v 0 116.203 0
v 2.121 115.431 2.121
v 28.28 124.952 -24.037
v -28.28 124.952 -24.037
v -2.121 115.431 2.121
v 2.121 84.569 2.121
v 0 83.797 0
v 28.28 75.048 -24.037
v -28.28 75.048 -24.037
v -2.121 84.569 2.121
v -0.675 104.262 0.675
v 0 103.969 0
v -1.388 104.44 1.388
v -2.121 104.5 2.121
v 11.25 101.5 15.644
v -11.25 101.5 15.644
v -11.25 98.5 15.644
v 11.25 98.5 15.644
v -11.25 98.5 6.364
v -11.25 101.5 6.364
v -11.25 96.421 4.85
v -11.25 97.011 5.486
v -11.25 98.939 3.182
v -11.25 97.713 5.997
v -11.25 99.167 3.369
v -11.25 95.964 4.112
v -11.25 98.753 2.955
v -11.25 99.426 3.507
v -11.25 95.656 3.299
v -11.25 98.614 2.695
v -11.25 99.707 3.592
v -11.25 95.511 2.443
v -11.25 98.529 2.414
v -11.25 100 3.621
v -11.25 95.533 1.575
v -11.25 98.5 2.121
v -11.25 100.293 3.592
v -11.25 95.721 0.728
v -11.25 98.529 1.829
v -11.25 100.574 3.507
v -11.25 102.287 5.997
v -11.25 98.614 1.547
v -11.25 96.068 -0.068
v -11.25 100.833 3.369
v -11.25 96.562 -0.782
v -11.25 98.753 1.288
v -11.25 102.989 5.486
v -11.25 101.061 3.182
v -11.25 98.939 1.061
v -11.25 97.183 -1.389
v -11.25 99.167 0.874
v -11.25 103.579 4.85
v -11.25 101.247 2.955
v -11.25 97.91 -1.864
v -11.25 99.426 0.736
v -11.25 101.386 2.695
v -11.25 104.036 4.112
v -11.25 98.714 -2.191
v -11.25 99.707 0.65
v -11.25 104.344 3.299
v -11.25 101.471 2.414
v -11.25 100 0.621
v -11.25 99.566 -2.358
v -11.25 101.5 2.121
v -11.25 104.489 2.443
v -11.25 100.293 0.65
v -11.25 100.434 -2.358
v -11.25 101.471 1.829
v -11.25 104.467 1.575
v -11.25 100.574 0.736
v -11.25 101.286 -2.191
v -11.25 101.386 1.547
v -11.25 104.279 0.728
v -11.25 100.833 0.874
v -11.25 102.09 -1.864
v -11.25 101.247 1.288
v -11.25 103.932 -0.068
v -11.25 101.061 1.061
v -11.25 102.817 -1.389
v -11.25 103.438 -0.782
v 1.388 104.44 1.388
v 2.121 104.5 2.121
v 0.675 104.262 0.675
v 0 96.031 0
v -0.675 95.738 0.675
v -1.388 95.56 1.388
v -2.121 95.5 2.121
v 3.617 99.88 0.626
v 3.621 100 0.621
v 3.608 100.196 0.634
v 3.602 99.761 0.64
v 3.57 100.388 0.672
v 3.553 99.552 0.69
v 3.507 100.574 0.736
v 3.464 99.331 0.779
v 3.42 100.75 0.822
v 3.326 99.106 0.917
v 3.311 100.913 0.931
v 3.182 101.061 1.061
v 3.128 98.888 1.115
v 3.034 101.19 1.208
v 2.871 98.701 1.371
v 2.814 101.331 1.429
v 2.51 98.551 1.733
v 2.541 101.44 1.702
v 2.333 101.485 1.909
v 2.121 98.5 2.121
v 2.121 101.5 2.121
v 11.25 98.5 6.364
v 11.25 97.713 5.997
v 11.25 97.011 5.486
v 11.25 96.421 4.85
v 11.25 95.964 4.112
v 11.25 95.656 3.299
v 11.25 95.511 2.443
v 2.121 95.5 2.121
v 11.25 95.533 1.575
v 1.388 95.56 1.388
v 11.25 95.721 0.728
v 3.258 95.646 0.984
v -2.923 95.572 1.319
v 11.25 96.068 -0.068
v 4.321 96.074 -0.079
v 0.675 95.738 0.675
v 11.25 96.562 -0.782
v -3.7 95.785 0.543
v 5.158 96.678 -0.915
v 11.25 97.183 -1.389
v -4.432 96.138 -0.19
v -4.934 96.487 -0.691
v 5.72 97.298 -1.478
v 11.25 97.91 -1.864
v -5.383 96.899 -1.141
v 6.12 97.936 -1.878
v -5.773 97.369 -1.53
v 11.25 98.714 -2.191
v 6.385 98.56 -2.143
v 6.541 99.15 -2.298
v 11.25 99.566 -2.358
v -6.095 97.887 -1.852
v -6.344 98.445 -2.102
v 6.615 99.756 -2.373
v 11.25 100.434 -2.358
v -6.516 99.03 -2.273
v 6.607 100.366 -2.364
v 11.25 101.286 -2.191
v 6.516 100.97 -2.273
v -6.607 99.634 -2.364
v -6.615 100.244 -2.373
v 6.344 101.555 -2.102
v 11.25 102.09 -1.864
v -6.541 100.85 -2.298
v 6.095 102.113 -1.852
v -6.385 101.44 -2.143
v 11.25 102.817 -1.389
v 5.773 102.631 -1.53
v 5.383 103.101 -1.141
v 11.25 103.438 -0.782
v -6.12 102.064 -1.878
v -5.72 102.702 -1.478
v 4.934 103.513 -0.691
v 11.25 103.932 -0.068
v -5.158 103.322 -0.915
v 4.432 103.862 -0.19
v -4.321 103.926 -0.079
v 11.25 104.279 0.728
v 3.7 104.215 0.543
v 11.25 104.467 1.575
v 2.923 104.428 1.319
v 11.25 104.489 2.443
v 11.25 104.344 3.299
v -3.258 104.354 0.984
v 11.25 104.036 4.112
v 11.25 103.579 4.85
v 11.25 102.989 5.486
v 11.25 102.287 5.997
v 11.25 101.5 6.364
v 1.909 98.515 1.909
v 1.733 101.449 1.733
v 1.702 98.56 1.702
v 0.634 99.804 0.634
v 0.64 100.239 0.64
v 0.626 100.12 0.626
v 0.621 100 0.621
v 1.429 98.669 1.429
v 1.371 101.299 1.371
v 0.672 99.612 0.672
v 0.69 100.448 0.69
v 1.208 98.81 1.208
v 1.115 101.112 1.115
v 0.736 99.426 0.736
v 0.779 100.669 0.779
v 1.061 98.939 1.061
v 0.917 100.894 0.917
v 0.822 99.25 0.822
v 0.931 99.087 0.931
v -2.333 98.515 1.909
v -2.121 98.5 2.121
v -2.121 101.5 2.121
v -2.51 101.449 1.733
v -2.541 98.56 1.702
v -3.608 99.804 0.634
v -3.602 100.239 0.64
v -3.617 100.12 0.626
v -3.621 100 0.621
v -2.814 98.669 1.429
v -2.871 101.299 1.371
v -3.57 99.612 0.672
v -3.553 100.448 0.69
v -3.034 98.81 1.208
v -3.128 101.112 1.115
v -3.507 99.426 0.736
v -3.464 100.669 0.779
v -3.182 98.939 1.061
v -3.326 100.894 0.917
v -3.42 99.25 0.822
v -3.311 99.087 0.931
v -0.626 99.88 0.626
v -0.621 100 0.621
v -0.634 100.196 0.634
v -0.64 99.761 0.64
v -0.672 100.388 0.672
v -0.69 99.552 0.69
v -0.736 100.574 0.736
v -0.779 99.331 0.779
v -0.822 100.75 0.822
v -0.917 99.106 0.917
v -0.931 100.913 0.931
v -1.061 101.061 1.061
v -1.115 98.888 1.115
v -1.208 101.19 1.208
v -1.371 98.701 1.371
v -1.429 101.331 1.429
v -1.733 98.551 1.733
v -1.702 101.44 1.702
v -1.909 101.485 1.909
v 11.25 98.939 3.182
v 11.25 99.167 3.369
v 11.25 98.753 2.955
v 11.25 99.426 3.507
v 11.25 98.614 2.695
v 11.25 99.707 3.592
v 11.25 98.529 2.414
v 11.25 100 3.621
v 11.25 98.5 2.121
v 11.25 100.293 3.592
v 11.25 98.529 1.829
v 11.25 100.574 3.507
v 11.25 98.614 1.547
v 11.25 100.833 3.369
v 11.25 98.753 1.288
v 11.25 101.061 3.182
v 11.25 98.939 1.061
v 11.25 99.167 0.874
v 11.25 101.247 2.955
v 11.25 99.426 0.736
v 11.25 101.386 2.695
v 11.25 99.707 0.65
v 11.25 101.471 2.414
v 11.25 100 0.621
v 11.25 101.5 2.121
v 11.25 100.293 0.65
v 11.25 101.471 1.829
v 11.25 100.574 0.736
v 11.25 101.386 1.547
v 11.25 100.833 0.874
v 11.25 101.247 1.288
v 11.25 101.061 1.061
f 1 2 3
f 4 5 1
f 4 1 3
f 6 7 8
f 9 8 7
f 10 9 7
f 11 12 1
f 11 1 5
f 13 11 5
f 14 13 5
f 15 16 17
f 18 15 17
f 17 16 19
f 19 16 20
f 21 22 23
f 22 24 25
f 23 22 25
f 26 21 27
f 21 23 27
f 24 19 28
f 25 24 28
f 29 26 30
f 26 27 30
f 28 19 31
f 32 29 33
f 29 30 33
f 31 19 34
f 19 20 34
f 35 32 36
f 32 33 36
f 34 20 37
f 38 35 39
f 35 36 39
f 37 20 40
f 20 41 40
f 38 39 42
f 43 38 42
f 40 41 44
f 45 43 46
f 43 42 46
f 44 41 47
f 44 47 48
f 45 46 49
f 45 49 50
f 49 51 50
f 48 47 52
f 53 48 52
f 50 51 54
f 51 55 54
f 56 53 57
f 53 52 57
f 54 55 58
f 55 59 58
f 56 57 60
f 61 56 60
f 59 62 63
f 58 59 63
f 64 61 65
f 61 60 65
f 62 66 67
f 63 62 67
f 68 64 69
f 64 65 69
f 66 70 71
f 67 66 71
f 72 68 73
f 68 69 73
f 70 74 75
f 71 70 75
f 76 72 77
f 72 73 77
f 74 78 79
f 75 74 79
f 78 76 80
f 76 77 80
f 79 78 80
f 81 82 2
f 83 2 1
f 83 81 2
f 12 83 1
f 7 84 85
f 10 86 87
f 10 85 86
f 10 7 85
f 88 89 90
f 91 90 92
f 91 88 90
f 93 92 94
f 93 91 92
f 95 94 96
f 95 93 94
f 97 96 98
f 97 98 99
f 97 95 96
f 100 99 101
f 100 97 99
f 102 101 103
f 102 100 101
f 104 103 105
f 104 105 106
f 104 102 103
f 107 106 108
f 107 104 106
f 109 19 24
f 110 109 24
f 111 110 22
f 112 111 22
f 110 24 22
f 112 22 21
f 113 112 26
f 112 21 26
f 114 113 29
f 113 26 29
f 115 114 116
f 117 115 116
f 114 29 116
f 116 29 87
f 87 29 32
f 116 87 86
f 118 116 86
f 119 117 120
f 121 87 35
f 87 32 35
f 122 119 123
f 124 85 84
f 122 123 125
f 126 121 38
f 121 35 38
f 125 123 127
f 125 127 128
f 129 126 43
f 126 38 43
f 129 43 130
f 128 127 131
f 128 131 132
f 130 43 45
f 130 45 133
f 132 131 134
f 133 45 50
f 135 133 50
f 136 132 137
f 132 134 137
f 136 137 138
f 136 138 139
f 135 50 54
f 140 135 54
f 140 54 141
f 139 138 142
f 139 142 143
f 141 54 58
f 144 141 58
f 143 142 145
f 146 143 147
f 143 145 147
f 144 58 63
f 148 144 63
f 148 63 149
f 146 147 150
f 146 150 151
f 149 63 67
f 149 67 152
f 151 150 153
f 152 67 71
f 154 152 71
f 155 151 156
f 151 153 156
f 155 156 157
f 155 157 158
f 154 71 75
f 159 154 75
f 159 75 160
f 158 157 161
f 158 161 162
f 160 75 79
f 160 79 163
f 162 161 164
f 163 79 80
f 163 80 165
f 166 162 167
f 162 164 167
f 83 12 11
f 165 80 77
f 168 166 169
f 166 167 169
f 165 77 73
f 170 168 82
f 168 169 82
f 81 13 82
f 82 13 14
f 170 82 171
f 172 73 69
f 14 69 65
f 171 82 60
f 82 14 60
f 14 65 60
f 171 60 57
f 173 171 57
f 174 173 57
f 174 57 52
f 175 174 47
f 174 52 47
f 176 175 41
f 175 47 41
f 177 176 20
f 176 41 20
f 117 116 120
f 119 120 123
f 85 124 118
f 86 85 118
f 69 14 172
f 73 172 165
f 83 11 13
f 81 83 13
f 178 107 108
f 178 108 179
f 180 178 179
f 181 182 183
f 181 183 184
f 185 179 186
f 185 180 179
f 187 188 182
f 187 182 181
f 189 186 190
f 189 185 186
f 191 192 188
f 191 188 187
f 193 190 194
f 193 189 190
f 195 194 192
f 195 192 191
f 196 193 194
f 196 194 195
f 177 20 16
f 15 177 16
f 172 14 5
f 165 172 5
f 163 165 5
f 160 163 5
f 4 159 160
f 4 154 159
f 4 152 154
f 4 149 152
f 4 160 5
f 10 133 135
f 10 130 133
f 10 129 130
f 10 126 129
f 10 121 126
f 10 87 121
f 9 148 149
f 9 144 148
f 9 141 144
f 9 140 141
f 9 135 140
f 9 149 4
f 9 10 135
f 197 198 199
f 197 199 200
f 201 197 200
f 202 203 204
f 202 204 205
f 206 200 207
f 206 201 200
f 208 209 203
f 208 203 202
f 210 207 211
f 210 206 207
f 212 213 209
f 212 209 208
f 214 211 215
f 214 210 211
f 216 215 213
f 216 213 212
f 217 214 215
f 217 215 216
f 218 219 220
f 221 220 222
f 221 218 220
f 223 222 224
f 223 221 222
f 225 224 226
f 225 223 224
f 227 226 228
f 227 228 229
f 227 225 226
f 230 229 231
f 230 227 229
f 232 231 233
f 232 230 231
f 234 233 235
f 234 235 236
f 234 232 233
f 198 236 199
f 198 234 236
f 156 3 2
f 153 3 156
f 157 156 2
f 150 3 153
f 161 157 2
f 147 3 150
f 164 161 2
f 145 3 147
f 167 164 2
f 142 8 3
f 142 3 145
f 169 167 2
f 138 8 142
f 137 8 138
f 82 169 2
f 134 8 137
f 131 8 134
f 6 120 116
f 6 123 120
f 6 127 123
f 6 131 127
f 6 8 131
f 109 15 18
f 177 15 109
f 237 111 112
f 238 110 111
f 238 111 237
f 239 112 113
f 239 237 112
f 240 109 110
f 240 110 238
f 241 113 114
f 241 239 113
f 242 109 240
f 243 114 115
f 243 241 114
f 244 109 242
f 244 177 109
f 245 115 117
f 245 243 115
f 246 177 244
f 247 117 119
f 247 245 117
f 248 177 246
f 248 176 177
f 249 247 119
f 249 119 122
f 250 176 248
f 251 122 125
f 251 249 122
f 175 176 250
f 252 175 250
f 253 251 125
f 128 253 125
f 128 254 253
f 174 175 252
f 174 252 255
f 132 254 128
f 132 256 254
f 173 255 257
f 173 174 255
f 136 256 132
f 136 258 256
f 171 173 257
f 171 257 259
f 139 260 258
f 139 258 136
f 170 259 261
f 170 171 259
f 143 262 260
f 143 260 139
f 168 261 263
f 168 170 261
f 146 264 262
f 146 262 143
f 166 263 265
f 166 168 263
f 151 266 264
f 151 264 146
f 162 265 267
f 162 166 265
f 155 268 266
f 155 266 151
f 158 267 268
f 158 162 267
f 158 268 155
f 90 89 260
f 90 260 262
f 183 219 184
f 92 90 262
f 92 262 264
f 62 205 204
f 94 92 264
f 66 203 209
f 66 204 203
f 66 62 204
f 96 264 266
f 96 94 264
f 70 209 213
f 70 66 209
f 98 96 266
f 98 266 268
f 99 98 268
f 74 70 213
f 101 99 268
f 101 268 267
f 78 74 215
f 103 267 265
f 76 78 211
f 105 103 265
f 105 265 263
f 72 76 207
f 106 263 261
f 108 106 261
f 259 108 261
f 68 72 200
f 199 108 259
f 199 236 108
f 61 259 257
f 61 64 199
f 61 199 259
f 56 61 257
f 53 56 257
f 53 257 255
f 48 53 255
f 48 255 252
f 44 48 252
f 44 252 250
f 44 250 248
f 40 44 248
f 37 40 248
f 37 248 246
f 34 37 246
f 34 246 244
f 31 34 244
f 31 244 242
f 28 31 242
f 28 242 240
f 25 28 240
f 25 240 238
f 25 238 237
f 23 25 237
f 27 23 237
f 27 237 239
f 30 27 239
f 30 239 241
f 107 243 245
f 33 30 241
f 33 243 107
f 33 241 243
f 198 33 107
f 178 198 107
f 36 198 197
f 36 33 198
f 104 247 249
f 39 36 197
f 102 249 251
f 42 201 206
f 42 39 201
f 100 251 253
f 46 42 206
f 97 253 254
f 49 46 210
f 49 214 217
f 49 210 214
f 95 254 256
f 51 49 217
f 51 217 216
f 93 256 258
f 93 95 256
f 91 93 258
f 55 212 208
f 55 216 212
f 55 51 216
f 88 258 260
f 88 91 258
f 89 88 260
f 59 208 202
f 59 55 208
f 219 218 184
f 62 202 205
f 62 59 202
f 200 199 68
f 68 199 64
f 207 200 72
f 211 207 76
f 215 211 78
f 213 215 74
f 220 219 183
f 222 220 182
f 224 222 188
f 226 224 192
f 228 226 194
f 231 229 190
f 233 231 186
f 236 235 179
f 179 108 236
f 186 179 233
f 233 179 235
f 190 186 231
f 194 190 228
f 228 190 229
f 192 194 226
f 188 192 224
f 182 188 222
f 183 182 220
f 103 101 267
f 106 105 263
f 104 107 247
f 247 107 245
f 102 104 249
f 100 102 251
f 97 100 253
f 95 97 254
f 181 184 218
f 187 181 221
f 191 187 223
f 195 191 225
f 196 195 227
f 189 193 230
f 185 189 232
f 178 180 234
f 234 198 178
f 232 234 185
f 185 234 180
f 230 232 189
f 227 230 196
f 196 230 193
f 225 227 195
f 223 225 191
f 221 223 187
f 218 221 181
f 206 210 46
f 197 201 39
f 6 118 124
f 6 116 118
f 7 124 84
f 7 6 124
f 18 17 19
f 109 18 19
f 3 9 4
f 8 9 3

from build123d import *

# Parameters (mm, degrees)
EXTRUDE_1_DEPTH          = 200
CUT_EXTRUDE_1_DEPTH      = 222.718927326
CUT_EXTRUDE_1_DEPTH_BACK = 222.718927326
SKETCH_2_R               = 150
SKETCH_2_R_2             = 1.5
EXTRUDE_4_DEPTH          = 11.25
EXTRUDE_4_DEPTH_BACK     = 11.25
SKETCH_5_R               = 1.5
CUT_EXTRUDE_2_DEPTH      = 133.789577673
CUT_EXTRUDE_2_DEPTH_BACK = 133.789577673


with BuildPart() as part:
    # Эскиз1 → Бобышка-Вытянуть1 (new body)
    with BuildSketch(Plane(origin=(0, 0, 0), x_dir=(1, 0, 0), z_dir=(0, 1, 0))):
        Polygon((-63.065580883, 65.518470958), (69.761111645, 65.518470958), (2.121320344, -2.121320344), (0, 0), (-2.121320344, -2.121320344), (-69.761111645, 65.518470958), align=None)
    extrude(amount=EXTRUDE_1_DEPTH)

    # Эскиз2 → Вырез-Вытянуть1 (cut, two sides: drawn at the far end of the back side and taken through both)
    with BuildSketch(Plane(origin=(0, 0, 0), x_dir=(0, 0, -1), z_dir=(1, 0, 0)).offset(-CUT_EXTRUDE_1_DEPTH_BACK)):
        with Locations((-2.121320344, 100)):
            Circle(SKETCH_2_R)
        with Locations((-2.121320344, 100)):
            Circle(SKETCH_2_R_2, mode=Mode.SUBTRACT)
        Polygon((27.212959944, 126.107382569), (27.212959944, 73.892617431), (-7.080612422, 86.374456999), (-2.121320344, 100), (-7.080612422, 113.625543001), align=None, mode=Mode.SUBTRACT)
    extrude(amount=CUT_EXTRUDE_1_DEPTH + CUT_EXTRUDE_1_DEPTH_BACK, mode=Mode.SUBTRACT)

    # Эскиз5 → Бобышка-Вытянуть4 (add, two sides: drawn at the far end of the back side and taken through both)
    with BuildSketch(Plane(origin=(0, 0, 0), x_dir=(0, 0, -1), z_dir=(1, 0, 0)).offset(-EXTRUDE_4_DEPTH_BACK)):
        with BuildLine():
            ThreePointArc((-6.364433098, 98.5), (2.379124729, 100), (-6.364433098, 101.5))
            Line((-6.364433098, 101.5), (-15.643969281, 101.5))
            Line((-15.643969281, 101.5), (-15.643969281, 98.5))
            Line((-15.643969281, 98.5), (-6.364433098, 98.5))
        make_face()
        with Locations((-2.121320344, 100)):
            Circle(SKETCH_5_R, mode=Mode.SUBTRACT)
    extrude(amount=EXTRUDE_4_DEPTH + EXTRUDE_4_DEPTH_BACK)

    # Эскиз6 → Вырез-Вытянуть2 (cut, two sides: drawn at the far end of the back side and taken through both)
    with BuildSketch(Plane(origin=(0, 0, 0), x_dir=(1, 0, 0), z_dir=(0, 1, 0)).offset(-CUT_EXTRUDE_2_DEPTH_BACK)):
        Polygon((-50.182829752, 24.037490431), (0, 24.037490431), (93.439383522, 24.037490431), (93.439383522, 164.04737871), (-160.316075238, 164.04737871), (-160.316075238, 24.037490431), align=None)
    extrude(amount=CUT_EXTRUDE_2_DEPTH + CUT_EXTRUDE_2_DEPTH_BACK, mode=Mode.SUBTRACT)


solid = part.part
